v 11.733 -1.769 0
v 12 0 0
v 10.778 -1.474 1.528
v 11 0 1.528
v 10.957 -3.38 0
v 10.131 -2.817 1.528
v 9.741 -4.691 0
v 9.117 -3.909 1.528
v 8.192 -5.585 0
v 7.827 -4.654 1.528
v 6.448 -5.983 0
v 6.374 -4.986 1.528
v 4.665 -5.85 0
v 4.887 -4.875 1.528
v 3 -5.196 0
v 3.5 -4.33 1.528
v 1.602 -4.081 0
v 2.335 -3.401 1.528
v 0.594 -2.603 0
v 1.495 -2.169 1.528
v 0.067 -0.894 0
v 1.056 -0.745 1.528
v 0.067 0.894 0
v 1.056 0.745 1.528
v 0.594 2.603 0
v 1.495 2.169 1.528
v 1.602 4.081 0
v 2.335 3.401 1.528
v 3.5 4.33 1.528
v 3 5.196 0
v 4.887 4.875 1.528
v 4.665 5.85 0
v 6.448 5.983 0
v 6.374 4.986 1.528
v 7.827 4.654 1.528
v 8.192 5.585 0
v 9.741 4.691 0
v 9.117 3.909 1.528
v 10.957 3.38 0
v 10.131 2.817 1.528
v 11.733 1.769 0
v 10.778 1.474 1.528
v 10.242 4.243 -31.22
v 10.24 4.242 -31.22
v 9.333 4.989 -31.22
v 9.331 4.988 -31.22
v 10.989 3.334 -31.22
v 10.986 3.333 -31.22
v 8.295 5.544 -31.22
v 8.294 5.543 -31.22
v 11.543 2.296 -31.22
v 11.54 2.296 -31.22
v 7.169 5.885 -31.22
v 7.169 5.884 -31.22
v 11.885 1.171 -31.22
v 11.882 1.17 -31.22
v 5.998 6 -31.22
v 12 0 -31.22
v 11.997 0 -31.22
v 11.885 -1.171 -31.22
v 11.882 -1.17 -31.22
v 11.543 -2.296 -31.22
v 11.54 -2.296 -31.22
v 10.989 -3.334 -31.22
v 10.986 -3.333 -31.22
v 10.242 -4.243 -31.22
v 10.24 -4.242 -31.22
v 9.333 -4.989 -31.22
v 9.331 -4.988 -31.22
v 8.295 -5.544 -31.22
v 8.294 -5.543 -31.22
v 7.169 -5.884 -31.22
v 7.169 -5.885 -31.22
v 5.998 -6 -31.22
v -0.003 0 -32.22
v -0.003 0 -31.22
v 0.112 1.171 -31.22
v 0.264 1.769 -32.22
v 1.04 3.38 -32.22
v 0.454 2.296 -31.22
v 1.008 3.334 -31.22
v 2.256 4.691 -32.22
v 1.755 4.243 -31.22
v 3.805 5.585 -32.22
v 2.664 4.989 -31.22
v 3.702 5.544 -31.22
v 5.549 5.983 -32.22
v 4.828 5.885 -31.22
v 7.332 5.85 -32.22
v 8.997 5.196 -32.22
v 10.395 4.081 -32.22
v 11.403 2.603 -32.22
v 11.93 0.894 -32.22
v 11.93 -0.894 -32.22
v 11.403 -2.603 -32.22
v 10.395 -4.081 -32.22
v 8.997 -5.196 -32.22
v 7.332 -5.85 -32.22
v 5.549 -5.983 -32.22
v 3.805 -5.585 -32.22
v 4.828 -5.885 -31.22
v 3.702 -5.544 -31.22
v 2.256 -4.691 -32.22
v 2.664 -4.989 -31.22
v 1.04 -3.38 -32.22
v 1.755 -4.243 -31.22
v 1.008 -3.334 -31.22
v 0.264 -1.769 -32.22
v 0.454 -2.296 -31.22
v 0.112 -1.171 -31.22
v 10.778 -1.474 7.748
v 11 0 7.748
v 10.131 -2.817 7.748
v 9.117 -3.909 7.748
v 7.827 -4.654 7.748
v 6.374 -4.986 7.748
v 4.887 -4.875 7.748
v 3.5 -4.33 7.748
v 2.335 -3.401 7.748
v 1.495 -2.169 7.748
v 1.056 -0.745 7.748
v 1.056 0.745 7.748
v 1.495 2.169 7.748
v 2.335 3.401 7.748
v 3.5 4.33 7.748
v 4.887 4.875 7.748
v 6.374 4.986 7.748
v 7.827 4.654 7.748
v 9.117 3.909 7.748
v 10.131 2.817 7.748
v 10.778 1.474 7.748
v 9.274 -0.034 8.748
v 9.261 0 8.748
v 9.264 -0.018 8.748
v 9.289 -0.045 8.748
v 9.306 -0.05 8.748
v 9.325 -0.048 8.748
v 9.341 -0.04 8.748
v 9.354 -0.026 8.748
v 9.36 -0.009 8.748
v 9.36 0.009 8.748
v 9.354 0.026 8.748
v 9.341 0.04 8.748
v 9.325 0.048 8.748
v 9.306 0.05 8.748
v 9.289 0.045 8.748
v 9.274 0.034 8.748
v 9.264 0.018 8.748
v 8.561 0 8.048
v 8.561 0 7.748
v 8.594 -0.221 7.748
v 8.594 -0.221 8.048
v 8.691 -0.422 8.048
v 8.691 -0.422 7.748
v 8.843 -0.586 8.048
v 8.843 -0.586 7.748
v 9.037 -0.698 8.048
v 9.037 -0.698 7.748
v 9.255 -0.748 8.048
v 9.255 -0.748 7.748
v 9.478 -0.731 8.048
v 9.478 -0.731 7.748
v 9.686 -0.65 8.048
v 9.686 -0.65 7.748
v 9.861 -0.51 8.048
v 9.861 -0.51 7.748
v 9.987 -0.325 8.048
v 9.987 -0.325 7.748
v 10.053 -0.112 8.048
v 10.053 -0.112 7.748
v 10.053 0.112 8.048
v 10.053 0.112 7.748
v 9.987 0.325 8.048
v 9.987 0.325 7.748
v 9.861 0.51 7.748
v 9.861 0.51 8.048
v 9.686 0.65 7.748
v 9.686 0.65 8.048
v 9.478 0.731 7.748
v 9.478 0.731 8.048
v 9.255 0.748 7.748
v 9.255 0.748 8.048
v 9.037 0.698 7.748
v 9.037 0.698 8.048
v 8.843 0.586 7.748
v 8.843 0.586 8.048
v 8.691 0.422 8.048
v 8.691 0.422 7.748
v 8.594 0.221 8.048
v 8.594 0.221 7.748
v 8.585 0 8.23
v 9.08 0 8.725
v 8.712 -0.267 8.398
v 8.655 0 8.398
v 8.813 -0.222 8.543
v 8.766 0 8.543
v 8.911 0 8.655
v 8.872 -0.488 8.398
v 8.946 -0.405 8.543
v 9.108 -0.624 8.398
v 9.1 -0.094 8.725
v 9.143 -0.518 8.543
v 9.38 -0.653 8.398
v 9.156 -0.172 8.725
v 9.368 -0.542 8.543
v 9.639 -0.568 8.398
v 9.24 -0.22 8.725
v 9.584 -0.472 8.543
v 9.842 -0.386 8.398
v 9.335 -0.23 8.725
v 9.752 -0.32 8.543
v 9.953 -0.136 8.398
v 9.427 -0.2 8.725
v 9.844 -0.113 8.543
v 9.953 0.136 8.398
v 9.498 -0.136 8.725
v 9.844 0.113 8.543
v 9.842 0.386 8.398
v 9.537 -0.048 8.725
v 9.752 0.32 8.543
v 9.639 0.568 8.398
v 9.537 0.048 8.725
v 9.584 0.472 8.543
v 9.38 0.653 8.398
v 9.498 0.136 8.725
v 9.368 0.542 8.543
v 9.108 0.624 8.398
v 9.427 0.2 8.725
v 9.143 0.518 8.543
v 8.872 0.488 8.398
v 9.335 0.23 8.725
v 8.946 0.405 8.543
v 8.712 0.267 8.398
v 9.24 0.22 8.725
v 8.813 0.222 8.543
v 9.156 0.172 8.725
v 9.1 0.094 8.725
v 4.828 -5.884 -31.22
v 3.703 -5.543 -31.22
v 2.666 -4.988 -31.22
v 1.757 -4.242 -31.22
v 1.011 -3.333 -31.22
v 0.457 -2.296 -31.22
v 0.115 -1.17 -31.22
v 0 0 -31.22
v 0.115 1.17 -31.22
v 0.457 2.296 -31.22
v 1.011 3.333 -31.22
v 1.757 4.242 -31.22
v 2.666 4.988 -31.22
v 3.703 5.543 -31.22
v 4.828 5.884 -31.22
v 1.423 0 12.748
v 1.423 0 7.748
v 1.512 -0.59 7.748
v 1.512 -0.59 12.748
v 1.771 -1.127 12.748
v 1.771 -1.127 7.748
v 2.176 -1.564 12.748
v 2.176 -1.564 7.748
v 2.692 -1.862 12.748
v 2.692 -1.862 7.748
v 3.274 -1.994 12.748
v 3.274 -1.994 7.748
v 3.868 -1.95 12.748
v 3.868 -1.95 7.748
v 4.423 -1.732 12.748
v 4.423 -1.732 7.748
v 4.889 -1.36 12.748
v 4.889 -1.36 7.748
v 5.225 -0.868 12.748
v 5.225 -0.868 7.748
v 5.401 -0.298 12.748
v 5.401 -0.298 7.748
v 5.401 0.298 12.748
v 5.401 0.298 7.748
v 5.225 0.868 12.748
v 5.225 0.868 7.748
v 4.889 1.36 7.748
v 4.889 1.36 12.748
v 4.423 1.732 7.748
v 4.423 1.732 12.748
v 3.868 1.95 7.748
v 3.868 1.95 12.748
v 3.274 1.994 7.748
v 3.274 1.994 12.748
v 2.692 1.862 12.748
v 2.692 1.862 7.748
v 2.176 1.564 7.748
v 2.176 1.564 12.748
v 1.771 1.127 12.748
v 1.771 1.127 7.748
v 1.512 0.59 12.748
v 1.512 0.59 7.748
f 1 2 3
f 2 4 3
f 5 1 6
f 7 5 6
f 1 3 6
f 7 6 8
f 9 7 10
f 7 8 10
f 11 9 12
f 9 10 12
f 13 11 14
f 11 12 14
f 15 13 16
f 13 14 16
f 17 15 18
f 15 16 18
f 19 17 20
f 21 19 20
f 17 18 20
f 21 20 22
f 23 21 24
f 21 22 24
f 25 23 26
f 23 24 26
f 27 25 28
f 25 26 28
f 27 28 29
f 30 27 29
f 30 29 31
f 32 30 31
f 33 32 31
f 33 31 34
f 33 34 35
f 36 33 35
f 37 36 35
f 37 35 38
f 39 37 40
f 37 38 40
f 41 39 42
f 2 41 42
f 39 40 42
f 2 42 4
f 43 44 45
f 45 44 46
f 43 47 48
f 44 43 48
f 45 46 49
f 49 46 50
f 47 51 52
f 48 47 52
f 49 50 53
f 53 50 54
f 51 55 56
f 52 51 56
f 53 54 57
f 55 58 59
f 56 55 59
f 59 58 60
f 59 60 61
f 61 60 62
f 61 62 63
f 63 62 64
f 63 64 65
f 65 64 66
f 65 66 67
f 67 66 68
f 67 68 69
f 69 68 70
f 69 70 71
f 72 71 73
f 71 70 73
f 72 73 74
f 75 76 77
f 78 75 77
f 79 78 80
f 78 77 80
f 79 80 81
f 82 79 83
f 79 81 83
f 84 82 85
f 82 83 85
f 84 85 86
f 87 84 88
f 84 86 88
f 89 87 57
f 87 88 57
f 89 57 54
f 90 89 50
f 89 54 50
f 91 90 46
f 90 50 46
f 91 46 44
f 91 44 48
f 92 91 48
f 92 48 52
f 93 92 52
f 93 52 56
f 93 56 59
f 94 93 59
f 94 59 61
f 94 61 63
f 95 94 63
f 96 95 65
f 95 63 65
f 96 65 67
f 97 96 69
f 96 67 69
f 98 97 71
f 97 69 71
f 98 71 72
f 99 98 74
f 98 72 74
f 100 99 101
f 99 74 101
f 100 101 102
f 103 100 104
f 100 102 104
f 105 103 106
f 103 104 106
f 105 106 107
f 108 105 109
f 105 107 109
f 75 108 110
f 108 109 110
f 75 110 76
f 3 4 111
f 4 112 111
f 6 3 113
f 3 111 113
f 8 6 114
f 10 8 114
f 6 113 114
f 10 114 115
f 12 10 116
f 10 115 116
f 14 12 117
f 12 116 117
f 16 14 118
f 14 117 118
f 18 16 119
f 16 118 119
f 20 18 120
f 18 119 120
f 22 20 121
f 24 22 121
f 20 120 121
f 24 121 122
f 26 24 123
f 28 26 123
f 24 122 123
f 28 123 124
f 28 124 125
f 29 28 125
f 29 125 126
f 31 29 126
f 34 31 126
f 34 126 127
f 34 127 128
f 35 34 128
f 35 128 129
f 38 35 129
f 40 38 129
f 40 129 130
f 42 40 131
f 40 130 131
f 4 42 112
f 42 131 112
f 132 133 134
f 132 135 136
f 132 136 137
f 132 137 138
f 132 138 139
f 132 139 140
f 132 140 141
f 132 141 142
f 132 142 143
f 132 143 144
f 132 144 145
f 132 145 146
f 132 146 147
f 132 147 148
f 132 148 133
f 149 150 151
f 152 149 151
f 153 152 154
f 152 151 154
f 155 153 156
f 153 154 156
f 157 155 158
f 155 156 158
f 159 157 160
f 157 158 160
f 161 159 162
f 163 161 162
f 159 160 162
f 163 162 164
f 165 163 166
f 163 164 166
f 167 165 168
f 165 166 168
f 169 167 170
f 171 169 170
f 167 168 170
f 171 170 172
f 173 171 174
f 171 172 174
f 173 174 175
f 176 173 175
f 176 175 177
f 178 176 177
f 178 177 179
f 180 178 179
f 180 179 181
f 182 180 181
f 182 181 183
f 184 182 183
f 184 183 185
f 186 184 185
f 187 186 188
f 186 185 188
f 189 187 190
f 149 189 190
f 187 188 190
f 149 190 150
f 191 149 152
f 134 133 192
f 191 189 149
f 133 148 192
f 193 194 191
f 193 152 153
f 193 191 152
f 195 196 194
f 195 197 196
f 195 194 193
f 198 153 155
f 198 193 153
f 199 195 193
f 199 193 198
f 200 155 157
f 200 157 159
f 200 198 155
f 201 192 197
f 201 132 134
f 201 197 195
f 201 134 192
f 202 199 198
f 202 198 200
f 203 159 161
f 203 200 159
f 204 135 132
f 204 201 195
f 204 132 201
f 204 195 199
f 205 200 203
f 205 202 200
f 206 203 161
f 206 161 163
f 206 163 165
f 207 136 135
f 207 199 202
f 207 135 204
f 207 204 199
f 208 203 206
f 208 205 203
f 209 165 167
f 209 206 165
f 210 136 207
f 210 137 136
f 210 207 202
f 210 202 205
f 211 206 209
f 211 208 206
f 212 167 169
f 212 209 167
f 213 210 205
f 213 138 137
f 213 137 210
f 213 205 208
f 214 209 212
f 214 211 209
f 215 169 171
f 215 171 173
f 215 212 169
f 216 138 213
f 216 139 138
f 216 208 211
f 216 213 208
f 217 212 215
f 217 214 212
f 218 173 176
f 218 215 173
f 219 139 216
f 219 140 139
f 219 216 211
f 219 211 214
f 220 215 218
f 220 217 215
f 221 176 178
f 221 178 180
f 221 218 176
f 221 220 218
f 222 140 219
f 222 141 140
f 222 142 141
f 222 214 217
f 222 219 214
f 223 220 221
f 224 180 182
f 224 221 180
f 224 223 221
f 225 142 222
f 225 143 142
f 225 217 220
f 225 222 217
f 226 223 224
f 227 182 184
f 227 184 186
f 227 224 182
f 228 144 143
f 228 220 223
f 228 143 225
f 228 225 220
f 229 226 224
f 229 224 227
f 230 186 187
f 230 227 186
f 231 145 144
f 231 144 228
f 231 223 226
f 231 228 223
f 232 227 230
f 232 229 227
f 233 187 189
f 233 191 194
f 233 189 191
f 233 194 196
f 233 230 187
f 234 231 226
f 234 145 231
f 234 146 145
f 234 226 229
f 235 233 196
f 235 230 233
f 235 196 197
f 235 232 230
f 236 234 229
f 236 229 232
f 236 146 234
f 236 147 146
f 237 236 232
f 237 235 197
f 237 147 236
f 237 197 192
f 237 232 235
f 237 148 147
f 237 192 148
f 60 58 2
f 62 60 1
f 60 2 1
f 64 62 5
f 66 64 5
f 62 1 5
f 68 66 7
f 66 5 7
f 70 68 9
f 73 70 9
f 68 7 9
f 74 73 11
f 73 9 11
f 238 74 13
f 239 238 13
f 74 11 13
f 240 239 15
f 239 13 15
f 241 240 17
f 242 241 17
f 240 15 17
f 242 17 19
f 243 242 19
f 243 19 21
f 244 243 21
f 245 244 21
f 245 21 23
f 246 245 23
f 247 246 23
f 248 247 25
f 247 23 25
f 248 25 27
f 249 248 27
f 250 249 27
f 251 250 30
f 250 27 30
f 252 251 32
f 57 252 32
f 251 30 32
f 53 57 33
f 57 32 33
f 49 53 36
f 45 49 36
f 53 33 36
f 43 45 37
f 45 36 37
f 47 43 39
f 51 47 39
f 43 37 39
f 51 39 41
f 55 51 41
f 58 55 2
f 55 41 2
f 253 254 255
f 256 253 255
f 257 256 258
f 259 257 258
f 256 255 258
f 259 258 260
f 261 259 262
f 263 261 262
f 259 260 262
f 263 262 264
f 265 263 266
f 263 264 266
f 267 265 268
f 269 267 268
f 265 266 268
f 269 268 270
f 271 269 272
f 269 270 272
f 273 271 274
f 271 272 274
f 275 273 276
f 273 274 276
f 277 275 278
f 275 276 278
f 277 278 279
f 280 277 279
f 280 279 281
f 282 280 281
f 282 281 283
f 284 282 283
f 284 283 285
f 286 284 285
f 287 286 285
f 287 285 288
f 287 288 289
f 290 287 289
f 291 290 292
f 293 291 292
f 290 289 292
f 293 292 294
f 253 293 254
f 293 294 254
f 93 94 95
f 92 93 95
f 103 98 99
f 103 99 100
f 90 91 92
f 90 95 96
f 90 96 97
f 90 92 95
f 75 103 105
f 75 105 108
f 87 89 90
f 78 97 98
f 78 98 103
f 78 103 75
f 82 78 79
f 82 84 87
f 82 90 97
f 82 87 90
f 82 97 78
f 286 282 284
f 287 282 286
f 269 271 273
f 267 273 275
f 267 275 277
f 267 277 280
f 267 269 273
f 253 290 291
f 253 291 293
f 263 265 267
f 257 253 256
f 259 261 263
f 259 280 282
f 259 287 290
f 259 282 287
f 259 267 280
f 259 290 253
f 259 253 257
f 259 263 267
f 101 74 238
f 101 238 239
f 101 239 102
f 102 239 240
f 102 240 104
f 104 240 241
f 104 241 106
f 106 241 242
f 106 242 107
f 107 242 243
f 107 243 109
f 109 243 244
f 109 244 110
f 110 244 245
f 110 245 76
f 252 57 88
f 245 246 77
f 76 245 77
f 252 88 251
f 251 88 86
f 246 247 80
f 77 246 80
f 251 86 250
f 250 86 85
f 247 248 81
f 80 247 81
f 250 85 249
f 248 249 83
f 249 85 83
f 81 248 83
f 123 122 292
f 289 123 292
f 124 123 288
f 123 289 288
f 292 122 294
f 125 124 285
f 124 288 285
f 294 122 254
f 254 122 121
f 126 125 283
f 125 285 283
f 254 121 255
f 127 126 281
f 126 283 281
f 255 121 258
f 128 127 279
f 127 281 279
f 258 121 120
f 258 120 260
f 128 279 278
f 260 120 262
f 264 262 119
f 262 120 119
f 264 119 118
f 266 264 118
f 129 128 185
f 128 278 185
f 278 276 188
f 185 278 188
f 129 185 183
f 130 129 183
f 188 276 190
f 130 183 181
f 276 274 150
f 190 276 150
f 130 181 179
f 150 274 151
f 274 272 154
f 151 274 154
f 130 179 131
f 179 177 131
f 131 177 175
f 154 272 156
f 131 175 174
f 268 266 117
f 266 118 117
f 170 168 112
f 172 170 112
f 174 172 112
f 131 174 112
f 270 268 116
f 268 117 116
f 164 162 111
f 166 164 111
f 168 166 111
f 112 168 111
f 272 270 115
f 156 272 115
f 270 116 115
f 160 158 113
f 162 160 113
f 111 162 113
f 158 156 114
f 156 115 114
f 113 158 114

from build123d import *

# Parameters (mm, degrees)
SKETCH2_R           = 0.75
BOSS_EXTRUDE1_DEPTH = 1
FILLET1_R           = 0.7
SKETCH3_R           = 2
BOSS_EXTRUDE2_DEPTH = 5
SKETCH4_R           = 6
BOSS_EXTRUDE3_DEPTH = 1


with BuildPart() as part:
    # Sketch1 → Revolve1 (revolve)
    with BuildSketch(Plane(origin=(0, 0, 0), x_dir=(1, 0, 0), z_dir=(0, 1, 0)), mode=Mode.PRIVATE) as revolve1_sk:
        Polygon((0, 31.22), (0, 0), (1, -1.528489116), (1, -7.748489116), (6, -7.748489116), (6, 31.22), align=None)
    revolve(revolve1_sk.sketch.rotate(Axis((6, 0, 7.748489116), (0, 0, -1)), 180), axis=Axis((6, 0, 7.748489116), (0, 0, -1)))

    # Sketch2 → Boss-Extrude1 (add)
    with BuildSketch(Plane.XY.offset(7.748489116)):
        with Locations(Location((9.311049148, 0, 0), (0, 0, 180))):
            Circle(SKETCH2_R)
    extrude(amount=BOSS_EXTRUDE1_DEPTH)

    # Fillet1
    fillet1_edges = [part.edges().sort_by_distance(p)[0] for p in [
        (10.061049148, 0, 8.748489116),
    ]]
    fillet(fillet1_edges, radius=FILLET1_R)

    # Sketch3 → Boss-Extrude2 (add)
    with BuildSketch(Plane.XY.offset(7.748489116)):
        with Locations(Location((3.423004201, 0, 0), (0, 0, 180))):
            Circle(SKETCH3_R)
    extrude(amount=BOSS_EXTRUDE2_DEPTH)

    # Sketch4 → Boss-Extrude3 (add)
    with BuildSketch(Plane(origin=(0, 0, -31.22), x_dir=(-1, 0, 0), z_dir=(0, 0, -1))):
        with Locations((-5.996963967, 0)):
            Circle(SKETCH4_R)
    extrude(amount=BOSS_EXTRUDE3_DEPTH)


solid = part.part
